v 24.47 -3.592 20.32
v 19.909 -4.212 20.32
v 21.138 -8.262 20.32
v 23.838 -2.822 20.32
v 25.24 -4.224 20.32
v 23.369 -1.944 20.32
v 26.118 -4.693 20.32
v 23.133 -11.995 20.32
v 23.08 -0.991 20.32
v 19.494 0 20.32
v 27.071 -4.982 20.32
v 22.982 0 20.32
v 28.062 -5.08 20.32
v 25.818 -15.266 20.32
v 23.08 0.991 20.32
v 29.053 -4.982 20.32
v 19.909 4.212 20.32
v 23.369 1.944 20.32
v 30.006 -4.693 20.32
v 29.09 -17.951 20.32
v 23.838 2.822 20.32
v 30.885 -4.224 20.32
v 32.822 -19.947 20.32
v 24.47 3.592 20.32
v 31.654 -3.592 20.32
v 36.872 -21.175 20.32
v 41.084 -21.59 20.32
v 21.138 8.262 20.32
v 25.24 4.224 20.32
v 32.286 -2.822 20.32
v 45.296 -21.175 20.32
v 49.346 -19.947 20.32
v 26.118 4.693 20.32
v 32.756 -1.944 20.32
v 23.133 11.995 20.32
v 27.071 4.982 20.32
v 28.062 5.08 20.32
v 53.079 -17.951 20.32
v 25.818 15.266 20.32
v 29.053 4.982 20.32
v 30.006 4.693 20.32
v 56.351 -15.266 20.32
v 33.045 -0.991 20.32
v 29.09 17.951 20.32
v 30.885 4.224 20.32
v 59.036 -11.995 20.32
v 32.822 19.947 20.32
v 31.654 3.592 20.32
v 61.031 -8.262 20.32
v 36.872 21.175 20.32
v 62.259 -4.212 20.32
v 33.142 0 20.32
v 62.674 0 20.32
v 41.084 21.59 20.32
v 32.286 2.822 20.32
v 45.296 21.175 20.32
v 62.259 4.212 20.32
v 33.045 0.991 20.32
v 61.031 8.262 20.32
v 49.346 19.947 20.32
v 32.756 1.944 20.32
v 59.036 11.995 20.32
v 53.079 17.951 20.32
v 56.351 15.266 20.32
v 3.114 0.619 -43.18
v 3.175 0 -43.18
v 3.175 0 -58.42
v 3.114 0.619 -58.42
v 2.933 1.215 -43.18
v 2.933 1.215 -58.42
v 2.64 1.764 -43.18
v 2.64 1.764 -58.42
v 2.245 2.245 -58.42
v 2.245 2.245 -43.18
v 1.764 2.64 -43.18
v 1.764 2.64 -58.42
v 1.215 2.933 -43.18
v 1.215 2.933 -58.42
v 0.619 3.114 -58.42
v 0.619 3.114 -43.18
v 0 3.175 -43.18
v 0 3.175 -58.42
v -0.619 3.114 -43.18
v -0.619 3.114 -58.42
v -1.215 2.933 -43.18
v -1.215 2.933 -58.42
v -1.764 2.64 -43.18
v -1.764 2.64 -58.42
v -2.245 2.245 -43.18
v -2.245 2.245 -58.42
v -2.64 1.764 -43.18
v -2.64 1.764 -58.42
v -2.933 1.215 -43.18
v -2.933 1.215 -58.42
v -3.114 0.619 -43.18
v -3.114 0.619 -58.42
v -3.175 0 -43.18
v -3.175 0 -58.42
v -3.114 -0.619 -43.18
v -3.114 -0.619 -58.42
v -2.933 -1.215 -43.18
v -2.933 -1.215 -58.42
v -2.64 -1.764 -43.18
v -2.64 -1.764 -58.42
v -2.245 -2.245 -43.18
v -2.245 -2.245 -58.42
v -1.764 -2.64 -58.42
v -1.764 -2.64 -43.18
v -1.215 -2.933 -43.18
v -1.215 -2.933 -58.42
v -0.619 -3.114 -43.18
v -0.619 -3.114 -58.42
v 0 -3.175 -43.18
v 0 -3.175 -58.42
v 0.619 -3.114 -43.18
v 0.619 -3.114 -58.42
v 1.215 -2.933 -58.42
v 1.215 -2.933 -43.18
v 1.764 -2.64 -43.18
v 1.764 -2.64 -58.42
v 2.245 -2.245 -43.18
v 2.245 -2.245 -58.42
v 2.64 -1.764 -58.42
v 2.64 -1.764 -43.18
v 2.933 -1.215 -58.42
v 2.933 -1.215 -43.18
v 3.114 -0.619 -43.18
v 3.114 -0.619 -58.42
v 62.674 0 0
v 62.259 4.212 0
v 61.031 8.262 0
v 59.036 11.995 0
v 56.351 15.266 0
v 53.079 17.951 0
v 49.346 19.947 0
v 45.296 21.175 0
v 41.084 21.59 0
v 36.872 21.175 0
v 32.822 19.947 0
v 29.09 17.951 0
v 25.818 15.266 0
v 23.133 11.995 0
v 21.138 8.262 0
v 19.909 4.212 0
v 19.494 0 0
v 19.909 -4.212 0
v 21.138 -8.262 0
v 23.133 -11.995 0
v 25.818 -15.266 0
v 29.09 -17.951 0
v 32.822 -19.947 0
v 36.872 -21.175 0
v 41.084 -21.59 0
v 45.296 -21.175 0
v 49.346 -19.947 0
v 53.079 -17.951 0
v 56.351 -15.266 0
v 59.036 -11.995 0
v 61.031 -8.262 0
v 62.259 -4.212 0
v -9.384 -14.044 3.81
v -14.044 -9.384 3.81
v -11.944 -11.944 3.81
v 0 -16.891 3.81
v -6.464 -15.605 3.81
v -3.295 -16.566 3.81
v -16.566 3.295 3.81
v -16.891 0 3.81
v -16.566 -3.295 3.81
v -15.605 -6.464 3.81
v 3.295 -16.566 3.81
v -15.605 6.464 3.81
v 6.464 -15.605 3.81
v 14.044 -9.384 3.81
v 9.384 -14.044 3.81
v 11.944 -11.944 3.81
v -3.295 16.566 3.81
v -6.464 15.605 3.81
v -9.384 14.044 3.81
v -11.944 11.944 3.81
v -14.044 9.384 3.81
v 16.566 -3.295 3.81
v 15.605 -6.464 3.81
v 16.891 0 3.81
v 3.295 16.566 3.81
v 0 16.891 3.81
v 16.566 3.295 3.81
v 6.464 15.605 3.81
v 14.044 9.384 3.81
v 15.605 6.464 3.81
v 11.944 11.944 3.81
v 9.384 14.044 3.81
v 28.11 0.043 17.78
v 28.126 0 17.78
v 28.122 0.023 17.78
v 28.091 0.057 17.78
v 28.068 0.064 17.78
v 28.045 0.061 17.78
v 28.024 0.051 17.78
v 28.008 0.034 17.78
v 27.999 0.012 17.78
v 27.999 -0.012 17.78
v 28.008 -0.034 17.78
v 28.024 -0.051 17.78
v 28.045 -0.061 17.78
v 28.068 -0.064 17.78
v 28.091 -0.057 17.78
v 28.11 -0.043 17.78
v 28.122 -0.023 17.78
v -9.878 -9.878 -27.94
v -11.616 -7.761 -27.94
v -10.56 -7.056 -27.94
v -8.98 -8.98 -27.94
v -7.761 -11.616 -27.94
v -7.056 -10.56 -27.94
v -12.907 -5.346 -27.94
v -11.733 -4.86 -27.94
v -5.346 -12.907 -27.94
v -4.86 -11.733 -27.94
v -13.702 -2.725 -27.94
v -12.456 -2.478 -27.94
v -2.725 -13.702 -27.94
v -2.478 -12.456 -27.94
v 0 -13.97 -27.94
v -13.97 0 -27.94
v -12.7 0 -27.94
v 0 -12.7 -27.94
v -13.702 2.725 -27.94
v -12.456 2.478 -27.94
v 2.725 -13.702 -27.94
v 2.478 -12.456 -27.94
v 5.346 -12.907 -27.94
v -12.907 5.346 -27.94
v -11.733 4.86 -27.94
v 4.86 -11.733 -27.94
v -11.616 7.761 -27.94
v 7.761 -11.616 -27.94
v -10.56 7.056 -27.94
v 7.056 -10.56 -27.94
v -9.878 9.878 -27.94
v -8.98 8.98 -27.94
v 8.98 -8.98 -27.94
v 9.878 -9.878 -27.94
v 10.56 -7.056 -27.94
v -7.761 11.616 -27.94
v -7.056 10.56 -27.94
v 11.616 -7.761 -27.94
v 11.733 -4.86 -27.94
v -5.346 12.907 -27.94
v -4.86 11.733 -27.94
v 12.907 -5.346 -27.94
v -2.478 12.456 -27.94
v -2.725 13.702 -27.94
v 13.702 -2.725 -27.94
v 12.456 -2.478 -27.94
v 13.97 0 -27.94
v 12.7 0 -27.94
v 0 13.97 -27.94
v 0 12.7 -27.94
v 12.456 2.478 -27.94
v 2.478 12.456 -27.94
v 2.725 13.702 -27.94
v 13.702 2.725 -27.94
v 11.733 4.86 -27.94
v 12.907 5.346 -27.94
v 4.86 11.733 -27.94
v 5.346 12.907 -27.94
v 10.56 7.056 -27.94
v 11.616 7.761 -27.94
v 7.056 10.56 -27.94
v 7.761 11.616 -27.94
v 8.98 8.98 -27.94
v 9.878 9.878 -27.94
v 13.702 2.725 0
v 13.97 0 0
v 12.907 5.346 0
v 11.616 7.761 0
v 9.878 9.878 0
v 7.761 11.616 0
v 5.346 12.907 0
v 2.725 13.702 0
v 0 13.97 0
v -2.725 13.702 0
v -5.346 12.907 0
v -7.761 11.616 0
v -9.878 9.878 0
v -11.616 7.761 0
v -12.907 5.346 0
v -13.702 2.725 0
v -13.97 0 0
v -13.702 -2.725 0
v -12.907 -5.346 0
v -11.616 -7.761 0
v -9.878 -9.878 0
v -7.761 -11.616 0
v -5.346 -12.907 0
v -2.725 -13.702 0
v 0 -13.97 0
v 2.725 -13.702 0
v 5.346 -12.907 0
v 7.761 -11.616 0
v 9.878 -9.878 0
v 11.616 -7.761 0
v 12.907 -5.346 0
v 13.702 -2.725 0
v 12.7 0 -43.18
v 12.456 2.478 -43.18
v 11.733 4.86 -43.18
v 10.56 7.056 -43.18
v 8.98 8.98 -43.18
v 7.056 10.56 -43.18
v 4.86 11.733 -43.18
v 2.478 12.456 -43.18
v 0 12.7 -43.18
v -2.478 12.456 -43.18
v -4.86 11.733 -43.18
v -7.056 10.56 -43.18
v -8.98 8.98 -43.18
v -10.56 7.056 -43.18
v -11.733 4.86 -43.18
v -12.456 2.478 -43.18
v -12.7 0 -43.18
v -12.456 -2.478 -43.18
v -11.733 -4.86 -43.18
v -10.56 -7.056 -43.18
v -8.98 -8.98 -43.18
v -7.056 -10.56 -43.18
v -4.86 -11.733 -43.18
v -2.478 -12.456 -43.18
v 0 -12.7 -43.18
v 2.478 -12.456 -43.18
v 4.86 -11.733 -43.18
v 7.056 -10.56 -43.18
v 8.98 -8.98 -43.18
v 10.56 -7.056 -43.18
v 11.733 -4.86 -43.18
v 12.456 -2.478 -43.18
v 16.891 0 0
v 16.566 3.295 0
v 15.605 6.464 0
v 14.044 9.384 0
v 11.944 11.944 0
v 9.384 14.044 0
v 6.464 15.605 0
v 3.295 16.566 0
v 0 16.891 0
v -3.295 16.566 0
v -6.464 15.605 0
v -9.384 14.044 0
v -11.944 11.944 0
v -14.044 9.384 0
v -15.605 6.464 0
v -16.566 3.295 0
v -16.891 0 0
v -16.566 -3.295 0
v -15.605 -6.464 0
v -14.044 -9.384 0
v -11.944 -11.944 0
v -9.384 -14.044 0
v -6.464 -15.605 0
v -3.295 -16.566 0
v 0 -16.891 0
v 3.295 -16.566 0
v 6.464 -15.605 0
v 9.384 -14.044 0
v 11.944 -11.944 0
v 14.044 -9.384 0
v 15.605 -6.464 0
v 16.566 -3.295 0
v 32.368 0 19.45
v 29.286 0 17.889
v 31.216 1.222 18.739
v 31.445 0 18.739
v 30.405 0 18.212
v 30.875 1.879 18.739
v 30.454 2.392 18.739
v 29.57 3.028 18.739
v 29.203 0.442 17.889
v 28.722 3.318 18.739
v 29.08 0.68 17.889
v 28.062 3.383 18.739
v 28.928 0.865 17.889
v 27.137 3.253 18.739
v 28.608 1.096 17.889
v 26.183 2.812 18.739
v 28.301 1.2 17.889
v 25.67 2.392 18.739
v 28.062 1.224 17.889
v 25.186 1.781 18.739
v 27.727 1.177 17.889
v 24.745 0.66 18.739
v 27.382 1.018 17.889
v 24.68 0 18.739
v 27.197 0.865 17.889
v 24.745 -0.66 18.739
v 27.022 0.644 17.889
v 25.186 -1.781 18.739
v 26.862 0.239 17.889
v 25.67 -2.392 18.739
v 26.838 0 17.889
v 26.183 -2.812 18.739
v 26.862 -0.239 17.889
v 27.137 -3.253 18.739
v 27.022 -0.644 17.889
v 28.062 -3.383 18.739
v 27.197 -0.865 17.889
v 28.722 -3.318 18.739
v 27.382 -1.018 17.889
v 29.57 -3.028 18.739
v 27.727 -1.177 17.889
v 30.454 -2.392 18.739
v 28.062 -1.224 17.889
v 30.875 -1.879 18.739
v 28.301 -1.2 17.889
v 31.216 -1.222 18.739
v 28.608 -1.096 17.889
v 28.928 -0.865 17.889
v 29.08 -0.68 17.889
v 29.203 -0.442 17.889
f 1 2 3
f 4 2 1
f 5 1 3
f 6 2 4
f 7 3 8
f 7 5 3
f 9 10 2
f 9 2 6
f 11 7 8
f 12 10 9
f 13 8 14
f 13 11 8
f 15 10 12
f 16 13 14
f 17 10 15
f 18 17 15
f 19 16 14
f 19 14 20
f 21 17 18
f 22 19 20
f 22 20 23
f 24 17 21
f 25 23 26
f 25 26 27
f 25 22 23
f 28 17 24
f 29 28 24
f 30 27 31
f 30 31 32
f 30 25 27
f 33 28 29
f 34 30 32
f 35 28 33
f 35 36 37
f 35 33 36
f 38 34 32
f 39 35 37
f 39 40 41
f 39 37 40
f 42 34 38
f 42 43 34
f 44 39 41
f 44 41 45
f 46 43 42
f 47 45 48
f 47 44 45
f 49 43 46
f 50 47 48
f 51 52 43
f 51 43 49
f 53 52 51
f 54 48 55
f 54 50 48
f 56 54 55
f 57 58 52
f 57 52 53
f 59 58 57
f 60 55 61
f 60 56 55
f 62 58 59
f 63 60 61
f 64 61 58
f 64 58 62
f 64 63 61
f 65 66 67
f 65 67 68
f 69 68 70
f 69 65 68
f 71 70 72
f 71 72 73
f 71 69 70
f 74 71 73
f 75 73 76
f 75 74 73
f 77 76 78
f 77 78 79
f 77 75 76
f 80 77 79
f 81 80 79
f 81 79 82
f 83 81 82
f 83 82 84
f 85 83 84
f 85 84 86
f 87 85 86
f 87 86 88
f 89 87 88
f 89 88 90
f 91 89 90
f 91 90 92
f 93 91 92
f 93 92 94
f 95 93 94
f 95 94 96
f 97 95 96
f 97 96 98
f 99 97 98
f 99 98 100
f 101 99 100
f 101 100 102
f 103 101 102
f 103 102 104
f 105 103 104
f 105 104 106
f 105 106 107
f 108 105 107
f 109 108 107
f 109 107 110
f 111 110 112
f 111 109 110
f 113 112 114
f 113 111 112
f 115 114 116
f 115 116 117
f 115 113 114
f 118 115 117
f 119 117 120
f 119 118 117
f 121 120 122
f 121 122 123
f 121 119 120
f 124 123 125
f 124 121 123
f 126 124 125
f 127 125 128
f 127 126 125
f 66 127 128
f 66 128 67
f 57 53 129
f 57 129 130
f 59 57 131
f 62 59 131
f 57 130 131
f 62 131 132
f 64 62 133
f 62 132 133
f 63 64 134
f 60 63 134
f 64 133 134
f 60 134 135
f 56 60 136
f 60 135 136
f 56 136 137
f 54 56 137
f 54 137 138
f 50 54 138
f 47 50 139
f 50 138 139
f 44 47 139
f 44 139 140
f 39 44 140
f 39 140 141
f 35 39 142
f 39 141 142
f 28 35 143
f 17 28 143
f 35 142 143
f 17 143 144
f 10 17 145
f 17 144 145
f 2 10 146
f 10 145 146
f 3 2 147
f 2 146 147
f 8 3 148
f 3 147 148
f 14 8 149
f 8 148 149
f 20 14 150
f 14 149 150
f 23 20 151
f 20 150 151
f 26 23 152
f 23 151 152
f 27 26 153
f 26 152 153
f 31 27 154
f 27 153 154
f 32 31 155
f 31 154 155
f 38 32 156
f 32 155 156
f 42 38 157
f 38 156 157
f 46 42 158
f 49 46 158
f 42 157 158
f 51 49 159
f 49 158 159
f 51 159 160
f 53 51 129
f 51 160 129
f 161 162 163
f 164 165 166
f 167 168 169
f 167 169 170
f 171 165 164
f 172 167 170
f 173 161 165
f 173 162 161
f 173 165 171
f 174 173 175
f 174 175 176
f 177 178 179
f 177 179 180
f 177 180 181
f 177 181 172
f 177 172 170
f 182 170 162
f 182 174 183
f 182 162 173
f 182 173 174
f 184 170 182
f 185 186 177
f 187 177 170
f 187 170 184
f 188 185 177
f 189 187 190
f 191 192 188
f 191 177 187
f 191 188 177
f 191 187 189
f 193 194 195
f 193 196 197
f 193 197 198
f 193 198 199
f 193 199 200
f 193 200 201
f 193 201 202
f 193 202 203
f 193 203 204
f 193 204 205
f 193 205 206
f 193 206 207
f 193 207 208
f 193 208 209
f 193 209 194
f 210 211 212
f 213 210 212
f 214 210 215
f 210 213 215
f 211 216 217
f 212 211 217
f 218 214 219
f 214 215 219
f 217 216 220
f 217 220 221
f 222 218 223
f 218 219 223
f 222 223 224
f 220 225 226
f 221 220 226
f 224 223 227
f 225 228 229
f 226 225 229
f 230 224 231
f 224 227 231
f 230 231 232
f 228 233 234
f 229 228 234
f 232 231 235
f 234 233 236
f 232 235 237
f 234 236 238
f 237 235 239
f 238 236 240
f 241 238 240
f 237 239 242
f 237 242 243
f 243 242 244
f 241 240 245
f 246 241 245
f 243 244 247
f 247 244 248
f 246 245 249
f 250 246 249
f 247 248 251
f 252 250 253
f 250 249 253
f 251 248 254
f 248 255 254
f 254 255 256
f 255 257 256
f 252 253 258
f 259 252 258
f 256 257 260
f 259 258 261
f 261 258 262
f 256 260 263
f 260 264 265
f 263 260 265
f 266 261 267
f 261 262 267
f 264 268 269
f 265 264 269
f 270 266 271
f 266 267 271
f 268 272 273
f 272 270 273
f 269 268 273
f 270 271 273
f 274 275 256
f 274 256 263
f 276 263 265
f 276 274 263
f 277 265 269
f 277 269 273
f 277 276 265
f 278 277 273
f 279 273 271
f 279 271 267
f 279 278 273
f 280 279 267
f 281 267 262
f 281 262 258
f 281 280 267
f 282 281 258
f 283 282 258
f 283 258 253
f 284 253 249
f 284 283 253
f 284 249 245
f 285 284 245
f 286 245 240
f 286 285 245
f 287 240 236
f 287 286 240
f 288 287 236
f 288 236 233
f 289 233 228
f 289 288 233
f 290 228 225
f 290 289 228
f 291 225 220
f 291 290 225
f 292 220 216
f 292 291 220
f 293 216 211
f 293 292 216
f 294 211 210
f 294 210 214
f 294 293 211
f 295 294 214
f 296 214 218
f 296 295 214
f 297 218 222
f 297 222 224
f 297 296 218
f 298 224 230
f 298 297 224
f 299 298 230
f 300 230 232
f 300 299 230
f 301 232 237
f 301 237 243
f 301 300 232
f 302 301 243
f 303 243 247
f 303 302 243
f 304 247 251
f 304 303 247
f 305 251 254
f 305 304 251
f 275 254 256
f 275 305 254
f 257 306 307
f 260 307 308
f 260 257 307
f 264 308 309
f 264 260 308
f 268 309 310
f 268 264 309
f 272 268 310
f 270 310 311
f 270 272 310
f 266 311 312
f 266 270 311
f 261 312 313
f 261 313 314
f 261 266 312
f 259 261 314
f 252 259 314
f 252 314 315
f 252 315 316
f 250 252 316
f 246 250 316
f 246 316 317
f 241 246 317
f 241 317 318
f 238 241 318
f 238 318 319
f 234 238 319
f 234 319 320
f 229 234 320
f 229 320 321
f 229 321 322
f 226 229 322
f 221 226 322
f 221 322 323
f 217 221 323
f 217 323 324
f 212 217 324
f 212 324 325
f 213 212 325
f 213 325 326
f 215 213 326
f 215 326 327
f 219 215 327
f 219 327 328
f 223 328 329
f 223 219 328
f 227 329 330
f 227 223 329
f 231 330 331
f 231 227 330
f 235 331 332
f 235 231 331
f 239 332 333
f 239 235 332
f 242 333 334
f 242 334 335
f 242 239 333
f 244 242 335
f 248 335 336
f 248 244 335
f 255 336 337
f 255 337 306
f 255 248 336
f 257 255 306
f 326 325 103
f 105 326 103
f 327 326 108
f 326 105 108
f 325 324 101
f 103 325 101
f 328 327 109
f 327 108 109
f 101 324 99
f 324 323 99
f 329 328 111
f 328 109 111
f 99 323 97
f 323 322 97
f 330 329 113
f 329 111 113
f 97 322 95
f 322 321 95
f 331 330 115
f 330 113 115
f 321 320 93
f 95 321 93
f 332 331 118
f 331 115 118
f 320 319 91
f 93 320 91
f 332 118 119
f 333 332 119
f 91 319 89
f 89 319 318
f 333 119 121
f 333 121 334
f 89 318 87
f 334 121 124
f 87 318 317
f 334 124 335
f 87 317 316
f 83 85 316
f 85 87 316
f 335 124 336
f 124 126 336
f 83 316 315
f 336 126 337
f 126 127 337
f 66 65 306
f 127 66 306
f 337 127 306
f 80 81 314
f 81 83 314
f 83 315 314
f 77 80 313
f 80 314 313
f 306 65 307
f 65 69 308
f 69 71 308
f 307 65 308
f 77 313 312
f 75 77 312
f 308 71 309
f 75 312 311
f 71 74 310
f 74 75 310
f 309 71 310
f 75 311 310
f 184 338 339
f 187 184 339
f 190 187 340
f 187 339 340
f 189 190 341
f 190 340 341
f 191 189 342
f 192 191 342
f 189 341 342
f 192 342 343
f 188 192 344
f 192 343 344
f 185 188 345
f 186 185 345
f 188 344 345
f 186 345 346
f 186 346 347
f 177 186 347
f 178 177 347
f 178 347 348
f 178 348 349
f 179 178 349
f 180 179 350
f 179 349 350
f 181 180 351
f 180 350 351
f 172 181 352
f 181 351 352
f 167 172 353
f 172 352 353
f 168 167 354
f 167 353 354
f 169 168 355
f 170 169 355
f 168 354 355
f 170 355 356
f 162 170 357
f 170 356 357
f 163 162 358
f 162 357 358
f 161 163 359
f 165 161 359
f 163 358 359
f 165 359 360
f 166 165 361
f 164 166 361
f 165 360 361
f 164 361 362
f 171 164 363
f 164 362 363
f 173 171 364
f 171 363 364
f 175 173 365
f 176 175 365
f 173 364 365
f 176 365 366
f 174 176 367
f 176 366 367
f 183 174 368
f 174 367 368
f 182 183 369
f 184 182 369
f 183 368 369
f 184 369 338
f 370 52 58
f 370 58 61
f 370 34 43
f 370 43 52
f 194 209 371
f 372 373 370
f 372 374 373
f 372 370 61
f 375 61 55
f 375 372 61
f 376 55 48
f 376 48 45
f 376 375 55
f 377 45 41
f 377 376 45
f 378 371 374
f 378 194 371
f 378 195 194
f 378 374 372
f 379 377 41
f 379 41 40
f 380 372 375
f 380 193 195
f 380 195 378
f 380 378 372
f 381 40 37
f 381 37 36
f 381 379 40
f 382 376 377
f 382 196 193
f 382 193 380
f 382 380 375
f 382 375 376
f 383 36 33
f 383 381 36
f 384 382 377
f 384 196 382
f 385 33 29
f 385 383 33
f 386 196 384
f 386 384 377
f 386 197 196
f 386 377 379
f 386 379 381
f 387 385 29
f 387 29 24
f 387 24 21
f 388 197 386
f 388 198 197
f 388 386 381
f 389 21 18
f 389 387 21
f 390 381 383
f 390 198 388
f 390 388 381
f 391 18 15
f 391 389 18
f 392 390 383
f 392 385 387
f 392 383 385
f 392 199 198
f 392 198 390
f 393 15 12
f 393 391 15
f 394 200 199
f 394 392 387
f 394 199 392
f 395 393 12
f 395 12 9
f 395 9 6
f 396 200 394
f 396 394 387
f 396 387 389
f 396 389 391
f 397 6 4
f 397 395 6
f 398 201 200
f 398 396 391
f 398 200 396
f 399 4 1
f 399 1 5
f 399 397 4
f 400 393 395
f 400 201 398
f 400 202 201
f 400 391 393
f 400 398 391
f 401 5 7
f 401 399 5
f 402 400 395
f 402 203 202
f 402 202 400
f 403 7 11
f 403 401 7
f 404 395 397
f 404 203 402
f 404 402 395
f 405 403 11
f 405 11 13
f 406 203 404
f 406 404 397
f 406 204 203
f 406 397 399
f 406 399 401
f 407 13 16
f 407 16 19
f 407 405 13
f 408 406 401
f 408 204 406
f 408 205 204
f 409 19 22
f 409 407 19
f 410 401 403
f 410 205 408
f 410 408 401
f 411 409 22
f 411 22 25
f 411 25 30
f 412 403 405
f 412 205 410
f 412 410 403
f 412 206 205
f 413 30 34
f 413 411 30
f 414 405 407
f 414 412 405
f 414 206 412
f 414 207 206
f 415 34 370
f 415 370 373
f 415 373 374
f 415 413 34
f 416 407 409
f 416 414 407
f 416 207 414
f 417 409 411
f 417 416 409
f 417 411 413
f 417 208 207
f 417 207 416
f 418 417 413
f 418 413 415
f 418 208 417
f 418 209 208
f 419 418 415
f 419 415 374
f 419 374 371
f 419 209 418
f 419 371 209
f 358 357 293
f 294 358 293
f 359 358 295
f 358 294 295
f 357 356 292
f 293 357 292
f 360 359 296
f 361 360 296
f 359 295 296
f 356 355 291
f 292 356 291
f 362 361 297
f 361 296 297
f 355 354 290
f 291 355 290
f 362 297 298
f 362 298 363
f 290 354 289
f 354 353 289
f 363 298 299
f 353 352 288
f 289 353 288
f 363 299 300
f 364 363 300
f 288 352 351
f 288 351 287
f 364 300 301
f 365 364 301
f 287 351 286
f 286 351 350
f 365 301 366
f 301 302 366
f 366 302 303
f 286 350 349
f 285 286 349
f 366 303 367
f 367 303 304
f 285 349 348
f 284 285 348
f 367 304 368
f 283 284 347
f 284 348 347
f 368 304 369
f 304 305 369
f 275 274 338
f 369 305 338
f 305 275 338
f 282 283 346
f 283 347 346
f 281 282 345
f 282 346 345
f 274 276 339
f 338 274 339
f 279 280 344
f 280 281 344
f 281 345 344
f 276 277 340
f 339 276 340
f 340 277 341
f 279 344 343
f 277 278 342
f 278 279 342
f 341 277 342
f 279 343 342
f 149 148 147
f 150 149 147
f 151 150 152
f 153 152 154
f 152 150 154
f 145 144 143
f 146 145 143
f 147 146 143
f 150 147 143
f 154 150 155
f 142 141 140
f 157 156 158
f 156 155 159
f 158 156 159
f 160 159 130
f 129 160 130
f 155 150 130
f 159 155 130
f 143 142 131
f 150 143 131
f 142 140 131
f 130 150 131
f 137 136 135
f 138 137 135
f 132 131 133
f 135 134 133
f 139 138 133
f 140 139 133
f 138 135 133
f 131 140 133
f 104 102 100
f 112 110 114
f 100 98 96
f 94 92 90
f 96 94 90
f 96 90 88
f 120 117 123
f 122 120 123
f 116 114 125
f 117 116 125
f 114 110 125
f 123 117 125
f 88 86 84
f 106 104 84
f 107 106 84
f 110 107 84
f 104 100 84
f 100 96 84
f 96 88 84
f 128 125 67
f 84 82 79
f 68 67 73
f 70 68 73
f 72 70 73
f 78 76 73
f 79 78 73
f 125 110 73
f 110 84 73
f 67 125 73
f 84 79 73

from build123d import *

# Parameters (mm, degrees)
F0_R     = 3.175
F1_DEPTH = 58.42
F0_R_2   = 12.7
F2_DEPTH = 43.18
F0_R_3   = 13.97
F3_DEPTH = 27.94
F0_R_4   = 16.891
F4_DEPTH = 3.81
F0_R_5   = 21.59
F5_DEPTH = 20.32
F6_R     = 5.08
F7_DEPTH = 2.54


# Not quite as in the source:
# - a fillet or chamfer that OpenCascade refuses, or shapes differently, is made with other operations: its cross-section is extruded or revolved along the edge and cut away or added


with BuildPart() as f1:
    # F0 (on Top) → F1 (new body)
    with BuildSketch(Plane.XY):
        Circle(F0_R)
    extrude(amount=-F1_DEPTH)

    # F0 (on Top) → F2 (join)
    with BuildSketch(Plane.XY):
        Circle(F0_R_2)
        Circle(F0_R, mode=Mode.SUBTRACT)
    extrude(amount=-F2_DEPTH)

    # F0 (on Top) → F3 (join)
    with BuildSketch(Plane.XY):
        Circle(F0_R_3)
        Circle(F0_R_2, mode=Mode.SUBTRACT)
    extrude(amount=-F3_DEPTH)

    # F0 (on Top) → F4 (join)
    with BuildSketch(Plane.XY):
        Circle(F0_R_4)
        Circle(F0_R_3, mode=Mode.SUBTRACT)
        Circle(F0_R_3)
        Circle(F0_R_2, mode=Mode.SUBTRACT)
        Circle(F0_R_2)
        Circle(F0_R, mode=Mode.SUBTRACT)
        Circle(F0_R)
    extrude(amount=F4_DEPTH)


with BuildPart() as f5:
    # F0 (on Top) → F5 (new body)
    with BuildSketch(Plane.XY):
        with Locations((41.0842709243, 0)):
            Circle(F0_R_5)
    extrude(amount=F5_DEPTH)

    # F6 (on face) → F7 (cut)
    with BuildSketch(Plane.XY.offset(20.32)):
        with Locations((28.0622877181, 0)):
            Circle(F6_R)
    extrude(amount=-F7_DEPTH, mode=Mode.SUBTRACT)

    # F8: fillet of radius 6.223 on 1 edges, made by hand

    # F8_s1 → F8_t2 (revolve)
    with BuildSketch(Plane.XZ):
        with BuildLine():
            ThreePointArc((33.1422877181, 20.32), (30.9374544728, 18.4511967794), (28.1261896329, 17.78))
            Line((28.1261896329, 17.78), (33.1422877181, 17.78))
            Line((33.1422877181, 17.78), (33.1422877181, 20.32))
        make_face()
    revolve(axis=Axis((28.0622877181, 0, 17.78), (0, 0, 1)))


solid = Compound([f1.part, f5.part])
